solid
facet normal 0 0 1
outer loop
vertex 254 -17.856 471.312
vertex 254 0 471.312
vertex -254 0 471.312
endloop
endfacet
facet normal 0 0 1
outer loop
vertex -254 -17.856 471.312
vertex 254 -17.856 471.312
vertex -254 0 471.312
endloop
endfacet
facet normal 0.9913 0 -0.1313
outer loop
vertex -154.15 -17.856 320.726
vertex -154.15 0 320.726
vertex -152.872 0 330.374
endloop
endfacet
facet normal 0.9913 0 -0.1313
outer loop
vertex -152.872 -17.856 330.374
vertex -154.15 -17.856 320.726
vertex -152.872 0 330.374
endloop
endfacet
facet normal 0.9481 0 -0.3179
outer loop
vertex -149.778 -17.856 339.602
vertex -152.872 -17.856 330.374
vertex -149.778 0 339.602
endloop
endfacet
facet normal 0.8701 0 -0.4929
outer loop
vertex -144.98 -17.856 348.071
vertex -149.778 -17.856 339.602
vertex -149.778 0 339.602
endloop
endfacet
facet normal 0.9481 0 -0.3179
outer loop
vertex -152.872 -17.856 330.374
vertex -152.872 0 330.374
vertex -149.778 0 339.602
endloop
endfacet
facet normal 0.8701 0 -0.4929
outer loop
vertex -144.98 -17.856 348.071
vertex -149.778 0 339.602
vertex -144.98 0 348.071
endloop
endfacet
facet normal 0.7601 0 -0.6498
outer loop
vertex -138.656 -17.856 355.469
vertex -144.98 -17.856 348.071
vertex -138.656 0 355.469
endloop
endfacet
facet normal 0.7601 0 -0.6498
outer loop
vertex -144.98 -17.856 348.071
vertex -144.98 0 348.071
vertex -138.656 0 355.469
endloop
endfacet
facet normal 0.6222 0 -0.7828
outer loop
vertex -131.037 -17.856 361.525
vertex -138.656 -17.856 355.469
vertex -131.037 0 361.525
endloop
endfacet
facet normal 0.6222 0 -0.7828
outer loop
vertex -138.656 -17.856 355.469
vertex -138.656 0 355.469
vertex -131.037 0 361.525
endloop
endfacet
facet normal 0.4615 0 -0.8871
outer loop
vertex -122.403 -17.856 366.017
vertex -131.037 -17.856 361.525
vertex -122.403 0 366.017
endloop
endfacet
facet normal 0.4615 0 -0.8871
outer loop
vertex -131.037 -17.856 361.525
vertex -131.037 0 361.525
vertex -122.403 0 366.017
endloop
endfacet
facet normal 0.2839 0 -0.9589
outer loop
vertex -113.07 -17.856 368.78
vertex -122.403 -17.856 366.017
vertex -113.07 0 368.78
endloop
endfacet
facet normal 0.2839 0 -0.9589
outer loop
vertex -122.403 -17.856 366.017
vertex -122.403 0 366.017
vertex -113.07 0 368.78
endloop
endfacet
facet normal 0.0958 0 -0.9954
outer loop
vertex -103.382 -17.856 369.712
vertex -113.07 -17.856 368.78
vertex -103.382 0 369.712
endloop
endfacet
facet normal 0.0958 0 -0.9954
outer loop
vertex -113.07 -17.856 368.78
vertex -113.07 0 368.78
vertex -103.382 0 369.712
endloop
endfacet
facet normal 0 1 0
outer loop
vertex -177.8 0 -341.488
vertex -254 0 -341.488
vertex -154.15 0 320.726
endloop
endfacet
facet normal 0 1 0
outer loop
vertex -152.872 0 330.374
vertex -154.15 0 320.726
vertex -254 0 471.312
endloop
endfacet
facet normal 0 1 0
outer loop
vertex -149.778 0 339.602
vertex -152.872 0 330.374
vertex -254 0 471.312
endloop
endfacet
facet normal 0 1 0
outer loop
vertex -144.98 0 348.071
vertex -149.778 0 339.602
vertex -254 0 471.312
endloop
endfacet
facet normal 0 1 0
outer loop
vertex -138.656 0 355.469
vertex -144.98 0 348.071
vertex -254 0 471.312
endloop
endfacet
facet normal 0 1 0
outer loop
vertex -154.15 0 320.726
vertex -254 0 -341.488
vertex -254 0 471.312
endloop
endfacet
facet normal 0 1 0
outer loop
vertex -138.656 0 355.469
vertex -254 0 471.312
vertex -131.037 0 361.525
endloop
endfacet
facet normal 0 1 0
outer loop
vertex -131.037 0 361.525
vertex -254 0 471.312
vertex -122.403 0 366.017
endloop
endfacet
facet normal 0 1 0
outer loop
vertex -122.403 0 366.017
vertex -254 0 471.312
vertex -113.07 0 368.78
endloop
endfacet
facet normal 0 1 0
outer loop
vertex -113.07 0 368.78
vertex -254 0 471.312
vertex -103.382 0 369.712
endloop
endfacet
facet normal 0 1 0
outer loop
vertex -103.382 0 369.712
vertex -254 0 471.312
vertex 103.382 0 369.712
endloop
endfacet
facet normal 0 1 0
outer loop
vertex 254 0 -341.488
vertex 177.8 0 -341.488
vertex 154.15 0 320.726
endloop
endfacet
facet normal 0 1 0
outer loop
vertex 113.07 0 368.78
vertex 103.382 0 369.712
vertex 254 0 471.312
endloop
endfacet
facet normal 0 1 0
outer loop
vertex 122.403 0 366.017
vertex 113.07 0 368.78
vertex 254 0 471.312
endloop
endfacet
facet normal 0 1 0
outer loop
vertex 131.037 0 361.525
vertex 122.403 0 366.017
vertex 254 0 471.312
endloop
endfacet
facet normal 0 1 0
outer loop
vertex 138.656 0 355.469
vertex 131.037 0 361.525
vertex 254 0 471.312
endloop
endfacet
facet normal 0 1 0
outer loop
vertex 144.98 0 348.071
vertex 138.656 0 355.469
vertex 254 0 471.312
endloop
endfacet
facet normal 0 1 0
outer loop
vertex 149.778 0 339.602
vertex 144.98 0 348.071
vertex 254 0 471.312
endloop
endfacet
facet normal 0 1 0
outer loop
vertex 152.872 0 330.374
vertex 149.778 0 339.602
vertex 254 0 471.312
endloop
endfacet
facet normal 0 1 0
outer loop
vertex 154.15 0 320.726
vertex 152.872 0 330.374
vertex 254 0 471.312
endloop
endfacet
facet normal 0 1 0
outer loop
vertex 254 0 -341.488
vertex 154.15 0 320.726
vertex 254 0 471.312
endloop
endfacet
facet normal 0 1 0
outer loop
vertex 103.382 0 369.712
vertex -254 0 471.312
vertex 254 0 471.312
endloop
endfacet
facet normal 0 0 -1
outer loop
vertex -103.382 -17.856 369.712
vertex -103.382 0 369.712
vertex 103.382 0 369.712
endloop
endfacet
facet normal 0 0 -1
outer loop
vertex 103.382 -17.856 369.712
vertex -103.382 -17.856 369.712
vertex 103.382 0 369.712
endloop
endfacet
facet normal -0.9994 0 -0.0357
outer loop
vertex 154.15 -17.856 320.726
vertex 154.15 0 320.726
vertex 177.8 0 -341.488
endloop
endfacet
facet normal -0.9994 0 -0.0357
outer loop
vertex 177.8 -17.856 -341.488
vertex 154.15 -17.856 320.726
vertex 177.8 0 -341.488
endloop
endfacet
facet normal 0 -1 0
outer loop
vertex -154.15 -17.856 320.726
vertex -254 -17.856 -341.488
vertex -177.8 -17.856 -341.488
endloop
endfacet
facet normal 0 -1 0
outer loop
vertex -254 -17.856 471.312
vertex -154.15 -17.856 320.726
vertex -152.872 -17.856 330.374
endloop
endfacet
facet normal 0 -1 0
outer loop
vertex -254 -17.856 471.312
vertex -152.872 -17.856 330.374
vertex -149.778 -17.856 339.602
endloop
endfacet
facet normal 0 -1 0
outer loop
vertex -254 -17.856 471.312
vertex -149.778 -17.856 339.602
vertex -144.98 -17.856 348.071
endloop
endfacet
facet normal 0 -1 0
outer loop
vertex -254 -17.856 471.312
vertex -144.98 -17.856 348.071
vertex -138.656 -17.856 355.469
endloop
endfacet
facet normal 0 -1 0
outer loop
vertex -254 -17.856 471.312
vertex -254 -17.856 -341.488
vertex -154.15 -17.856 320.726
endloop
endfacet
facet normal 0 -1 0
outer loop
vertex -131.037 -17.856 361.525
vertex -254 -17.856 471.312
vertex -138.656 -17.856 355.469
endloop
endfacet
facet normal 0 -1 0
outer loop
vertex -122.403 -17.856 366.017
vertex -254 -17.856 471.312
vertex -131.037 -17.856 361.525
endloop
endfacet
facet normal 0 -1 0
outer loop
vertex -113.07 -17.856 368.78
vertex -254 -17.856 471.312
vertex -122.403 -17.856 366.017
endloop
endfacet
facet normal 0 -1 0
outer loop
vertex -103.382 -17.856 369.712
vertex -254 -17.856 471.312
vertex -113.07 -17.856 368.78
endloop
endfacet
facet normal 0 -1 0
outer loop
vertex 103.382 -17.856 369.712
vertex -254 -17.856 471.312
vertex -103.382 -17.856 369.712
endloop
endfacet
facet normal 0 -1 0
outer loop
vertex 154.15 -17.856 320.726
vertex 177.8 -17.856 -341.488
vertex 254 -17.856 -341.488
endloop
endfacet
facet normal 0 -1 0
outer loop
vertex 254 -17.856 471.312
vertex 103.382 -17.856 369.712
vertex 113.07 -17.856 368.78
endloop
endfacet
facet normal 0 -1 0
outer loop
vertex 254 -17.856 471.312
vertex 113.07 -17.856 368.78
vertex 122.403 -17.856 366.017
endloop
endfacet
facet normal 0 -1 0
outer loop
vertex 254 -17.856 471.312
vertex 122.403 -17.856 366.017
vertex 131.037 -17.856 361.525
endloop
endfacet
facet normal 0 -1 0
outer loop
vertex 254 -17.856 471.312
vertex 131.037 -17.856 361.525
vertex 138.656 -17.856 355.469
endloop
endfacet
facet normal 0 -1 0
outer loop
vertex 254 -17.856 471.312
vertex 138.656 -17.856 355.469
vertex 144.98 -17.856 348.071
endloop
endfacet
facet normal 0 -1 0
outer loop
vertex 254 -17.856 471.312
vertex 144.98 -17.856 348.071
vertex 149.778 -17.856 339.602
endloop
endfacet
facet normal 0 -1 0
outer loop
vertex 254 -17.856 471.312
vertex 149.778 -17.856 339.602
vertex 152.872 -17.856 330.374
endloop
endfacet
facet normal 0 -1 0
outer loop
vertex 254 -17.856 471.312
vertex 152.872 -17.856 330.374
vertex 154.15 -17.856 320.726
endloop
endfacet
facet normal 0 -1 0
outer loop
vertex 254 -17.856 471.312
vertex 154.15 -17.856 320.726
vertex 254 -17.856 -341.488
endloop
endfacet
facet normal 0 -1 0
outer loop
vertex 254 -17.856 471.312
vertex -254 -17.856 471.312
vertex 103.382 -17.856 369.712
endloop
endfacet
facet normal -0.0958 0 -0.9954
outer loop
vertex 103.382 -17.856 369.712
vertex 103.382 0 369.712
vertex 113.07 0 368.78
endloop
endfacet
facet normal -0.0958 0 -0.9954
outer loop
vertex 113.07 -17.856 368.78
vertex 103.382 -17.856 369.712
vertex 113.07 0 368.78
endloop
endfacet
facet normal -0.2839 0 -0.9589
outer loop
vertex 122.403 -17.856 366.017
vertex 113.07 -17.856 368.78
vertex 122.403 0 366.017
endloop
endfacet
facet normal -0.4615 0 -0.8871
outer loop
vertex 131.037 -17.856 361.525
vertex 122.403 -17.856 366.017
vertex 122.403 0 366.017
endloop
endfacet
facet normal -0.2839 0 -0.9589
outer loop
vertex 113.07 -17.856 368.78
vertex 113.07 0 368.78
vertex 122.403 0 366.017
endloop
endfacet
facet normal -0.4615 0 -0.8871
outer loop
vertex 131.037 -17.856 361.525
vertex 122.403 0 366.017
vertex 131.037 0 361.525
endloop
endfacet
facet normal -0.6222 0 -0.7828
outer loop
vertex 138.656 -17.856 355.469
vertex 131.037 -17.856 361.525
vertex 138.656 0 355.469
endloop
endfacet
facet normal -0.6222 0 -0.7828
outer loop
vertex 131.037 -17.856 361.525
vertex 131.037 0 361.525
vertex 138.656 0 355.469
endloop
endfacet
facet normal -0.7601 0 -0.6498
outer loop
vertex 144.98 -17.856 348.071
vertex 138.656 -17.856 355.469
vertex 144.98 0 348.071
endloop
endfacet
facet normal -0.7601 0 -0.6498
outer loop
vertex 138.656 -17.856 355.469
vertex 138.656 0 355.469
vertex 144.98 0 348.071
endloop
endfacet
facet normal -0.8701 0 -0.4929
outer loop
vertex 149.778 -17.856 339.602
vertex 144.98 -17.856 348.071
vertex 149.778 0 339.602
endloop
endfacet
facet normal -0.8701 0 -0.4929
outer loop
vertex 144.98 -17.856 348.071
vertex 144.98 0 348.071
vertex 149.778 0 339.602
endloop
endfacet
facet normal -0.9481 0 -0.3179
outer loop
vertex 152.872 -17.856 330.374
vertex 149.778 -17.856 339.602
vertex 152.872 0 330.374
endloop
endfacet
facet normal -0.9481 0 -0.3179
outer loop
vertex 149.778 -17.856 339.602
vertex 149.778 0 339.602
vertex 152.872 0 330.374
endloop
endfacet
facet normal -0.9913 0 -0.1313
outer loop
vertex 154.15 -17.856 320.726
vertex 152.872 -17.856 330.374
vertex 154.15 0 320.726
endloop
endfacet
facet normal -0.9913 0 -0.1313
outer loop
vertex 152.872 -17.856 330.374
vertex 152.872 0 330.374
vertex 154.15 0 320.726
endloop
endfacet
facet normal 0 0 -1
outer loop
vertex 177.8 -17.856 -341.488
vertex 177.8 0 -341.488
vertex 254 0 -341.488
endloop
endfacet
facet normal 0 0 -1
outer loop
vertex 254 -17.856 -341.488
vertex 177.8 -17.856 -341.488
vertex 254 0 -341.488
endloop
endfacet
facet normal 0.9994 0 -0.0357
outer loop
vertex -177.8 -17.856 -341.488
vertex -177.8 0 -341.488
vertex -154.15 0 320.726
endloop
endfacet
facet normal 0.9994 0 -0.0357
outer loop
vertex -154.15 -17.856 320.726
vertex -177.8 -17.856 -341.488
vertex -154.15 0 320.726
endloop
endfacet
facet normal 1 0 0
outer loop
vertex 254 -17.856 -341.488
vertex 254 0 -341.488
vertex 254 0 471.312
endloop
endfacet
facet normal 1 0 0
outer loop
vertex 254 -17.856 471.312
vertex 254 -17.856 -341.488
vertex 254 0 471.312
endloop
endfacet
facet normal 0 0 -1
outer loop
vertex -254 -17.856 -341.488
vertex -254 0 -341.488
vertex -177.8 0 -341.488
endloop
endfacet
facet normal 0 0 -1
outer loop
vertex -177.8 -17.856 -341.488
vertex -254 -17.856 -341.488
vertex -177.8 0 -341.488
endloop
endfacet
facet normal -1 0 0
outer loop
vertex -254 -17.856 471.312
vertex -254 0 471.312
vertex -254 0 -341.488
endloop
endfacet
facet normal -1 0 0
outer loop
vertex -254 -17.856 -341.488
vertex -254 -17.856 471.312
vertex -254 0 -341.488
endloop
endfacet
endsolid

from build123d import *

# Parameters (mm, degrees)
F1_DEPTH = 17.8562


with BuildPart() as f1:
    # F0 (on Front) → F1 (new body)
    with BuildSketch(Plane.XZ):
        with BuildLine():
            Line((254, 471.312474), (-254, 471.312474))
            Line((-254, 471.312474), (-254, -341.487526))
            Line((-254, -341.487526), (-177.8, -341.487526))
            Line((-177.8, -341.487526), (-154.149531, 320.725604))
            ThreePointArc((-154.149531, 320.725604), (-138.65606, 355.468917), (-103.381898, 369.712474))
            Line((-103.381898, 369.712474), (103.381898, 369.712474))
            ThreePointArc((103.381898, 369.712474), (138.65606, 355.468917), (154.149531, 320.725604))
            Line((154.149531, 320.725604), (177.8, -341.487526))
            Line((177.8, -341.487526), (254, -341.487526))
            Line((254, -341.487526), (254, 471.312474))
        make_face()
    extrude(amount=F1_DEPTH)


solid = f1.part
